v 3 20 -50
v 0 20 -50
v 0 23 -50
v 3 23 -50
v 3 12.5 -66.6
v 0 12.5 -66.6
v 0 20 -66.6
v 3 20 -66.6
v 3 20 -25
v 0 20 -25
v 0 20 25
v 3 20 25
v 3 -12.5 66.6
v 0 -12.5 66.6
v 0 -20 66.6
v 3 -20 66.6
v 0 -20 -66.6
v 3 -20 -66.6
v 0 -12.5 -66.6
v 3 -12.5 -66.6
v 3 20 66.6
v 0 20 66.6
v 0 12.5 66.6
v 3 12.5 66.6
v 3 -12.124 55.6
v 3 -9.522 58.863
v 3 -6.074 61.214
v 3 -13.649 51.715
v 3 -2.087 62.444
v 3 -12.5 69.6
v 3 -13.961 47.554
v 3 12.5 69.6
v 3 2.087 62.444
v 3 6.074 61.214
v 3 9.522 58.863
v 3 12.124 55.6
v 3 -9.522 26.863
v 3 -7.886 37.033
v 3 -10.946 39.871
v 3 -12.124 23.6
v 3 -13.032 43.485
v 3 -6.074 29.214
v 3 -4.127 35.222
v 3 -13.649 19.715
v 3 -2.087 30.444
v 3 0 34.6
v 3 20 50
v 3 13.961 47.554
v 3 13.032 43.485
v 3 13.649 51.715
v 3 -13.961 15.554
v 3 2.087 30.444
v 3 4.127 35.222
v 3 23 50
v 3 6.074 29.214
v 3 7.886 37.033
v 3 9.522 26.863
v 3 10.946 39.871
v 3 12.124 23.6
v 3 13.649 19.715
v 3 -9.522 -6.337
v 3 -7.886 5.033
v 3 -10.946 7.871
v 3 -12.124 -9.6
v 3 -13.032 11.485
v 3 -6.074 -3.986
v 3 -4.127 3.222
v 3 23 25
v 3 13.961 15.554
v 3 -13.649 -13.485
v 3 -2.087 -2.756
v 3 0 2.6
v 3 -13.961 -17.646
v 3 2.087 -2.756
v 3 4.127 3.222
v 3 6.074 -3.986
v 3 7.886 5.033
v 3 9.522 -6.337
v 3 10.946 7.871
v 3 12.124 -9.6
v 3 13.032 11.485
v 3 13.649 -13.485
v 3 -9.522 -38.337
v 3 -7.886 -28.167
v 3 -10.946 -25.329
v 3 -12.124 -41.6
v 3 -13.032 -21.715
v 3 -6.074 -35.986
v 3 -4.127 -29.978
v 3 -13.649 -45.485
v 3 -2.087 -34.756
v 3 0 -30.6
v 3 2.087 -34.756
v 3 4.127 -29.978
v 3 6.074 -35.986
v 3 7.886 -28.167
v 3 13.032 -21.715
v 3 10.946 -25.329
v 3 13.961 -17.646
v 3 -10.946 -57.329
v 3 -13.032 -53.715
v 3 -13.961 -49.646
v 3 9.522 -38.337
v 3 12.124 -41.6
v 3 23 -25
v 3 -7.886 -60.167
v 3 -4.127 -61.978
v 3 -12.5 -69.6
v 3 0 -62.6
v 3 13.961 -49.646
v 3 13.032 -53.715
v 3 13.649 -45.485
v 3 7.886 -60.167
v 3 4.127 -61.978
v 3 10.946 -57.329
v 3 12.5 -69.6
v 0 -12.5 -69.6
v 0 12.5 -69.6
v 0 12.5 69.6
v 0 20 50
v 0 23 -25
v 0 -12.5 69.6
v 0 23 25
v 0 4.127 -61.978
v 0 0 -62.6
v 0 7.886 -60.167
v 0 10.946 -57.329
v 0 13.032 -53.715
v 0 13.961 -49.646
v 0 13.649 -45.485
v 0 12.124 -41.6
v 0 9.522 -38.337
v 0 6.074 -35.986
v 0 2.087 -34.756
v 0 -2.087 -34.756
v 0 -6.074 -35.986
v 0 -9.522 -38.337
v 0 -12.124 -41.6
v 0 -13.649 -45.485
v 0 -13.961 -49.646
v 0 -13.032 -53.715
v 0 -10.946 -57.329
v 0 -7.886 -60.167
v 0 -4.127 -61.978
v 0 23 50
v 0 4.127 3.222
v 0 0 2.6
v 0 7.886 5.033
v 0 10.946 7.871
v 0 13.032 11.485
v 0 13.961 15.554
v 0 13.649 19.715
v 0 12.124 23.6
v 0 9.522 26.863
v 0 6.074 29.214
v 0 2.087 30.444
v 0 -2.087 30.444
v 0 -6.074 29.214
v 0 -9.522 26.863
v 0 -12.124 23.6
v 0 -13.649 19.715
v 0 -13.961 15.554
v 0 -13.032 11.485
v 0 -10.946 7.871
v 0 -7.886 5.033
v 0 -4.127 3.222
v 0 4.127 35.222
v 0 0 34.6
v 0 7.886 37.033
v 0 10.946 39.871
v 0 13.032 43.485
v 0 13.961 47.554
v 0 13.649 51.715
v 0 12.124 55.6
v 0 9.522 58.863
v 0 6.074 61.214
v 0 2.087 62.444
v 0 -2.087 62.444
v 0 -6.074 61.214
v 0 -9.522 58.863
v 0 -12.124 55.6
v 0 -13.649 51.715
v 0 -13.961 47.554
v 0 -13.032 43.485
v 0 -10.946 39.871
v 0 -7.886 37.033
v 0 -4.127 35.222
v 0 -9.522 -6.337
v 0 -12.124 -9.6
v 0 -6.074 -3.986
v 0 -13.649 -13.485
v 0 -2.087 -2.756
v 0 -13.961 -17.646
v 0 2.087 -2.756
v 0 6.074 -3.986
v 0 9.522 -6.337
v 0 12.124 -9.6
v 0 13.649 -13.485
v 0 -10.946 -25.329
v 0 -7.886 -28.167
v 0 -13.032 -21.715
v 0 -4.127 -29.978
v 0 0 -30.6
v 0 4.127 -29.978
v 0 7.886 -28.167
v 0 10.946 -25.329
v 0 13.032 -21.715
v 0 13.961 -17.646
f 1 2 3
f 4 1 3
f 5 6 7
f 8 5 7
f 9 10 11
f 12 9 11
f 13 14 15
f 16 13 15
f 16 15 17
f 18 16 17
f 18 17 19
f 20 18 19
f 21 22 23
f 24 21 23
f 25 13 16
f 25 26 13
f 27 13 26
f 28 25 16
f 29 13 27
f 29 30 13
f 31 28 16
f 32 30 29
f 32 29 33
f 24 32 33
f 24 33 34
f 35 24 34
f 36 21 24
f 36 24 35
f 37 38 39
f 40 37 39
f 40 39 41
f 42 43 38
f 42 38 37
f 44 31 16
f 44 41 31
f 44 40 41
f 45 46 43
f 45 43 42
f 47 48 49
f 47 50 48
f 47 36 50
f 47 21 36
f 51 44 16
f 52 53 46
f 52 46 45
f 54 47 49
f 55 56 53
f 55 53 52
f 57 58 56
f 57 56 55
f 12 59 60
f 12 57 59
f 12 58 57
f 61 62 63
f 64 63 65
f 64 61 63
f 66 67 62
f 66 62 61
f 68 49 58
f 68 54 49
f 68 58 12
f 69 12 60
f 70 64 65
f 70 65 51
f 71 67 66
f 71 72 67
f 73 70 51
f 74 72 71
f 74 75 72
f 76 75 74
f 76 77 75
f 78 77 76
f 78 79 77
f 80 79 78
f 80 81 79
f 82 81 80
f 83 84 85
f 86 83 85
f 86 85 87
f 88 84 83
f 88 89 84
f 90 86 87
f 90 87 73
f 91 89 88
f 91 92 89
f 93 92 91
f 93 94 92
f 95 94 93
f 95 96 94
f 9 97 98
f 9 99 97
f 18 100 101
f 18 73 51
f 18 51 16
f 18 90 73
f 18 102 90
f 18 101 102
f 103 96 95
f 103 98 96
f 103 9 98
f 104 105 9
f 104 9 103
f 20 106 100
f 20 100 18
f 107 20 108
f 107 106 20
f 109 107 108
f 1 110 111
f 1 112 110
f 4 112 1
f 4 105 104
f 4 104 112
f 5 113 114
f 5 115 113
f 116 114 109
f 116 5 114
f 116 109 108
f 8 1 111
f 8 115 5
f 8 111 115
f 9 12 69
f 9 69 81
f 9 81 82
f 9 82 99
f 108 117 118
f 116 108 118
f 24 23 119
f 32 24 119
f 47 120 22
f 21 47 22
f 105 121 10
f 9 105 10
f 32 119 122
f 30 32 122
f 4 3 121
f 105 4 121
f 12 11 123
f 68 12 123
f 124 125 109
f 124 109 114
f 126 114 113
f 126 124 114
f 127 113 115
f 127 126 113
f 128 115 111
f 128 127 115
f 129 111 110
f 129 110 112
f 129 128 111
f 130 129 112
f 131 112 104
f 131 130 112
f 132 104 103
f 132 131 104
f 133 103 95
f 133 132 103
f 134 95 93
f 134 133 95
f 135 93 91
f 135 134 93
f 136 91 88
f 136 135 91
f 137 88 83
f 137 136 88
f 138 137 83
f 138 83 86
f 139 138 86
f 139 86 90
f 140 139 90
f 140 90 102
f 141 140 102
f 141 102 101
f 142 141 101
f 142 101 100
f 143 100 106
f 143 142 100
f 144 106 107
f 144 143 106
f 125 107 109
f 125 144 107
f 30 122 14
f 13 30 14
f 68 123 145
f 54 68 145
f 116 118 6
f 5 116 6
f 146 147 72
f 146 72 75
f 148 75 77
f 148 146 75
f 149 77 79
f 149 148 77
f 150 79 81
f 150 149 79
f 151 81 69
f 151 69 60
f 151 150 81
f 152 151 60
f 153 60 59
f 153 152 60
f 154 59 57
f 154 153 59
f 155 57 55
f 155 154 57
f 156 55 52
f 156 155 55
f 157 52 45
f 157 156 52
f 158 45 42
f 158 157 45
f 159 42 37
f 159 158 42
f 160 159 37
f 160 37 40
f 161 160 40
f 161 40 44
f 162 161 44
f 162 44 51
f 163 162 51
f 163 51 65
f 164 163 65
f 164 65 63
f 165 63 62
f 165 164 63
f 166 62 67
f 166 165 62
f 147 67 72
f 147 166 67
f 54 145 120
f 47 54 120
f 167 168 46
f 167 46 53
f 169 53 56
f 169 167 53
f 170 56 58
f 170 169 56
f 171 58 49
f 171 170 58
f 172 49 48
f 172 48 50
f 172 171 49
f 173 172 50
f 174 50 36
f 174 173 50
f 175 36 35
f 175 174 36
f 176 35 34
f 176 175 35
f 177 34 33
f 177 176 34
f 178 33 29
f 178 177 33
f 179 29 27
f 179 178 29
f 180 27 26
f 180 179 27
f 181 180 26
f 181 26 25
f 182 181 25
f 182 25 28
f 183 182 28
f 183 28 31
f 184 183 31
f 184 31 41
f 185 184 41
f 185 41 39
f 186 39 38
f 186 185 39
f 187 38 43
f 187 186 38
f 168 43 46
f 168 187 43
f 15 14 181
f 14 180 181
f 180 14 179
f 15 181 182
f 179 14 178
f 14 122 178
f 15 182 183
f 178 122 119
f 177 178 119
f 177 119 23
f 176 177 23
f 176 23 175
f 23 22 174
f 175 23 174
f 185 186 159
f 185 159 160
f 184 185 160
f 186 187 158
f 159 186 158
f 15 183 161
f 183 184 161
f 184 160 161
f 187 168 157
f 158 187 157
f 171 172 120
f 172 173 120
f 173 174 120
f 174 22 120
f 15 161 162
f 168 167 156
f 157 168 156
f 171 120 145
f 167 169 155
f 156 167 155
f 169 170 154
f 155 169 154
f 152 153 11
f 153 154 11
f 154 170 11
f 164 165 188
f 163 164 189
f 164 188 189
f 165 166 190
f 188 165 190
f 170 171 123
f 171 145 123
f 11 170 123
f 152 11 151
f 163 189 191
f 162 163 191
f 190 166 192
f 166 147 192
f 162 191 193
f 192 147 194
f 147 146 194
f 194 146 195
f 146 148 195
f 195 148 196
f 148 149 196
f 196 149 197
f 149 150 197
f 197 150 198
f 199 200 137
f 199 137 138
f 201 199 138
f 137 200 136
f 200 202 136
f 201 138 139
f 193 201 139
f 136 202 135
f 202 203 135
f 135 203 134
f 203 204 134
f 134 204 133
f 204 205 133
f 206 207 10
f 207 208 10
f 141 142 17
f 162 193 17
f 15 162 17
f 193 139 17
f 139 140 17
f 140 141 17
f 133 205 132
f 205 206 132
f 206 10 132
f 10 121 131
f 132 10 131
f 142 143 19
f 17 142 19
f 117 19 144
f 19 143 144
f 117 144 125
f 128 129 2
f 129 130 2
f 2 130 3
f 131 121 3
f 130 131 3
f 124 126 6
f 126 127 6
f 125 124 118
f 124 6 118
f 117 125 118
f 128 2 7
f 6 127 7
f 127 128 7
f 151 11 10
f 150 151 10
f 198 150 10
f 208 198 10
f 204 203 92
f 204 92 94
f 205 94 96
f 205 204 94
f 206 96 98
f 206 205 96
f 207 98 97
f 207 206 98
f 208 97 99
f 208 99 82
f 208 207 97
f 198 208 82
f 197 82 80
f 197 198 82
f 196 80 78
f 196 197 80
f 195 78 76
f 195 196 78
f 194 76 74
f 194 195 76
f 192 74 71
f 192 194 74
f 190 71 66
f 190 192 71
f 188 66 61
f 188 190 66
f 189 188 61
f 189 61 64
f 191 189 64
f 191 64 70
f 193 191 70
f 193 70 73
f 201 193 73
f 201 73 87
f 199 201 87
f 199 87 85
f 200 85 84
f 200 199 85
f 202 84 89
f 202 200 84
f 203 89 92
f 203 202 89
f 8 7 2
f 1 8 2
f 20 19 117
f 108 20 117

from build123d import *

# Parameters (mm, degrees)
SKETCH1_R           = 14
BOSS_EXTRUDE1_DEPTH = 3


with BuildPart() as part:
    # Sketch1 → Boss-Extrude1 (new body)
    with BuildSketch(Plane(origin=(0, 0, 0), x_dir=(0, 0, -1), z_dir=(1, 0, 0))):
        Polygon((-66.6, -12.5), (-66.6, -20), (66.6, -20), (66.6, -12.5), (69.6, -12.5), (69.6, 12.5), (66.6, 12.5), (66.6, 20), (50, 20), (50, 23), (25, 23), (25, 20), (-25, 20), (-25, 23), (-50, 23), (-50, 20), (-66.6, 20), (-66.6, 12.5), (-69.6, 12.5), (-69.6, -12.5), align=None)
        with Locations((-48.6, 0)):
            Circle(SKETCH1_R, mode=Mode.SUBTRACT)
        with Locations((-16.6, 0)):
            Circle(SKETCH1_R, mode=Mode.SUBTRACT)
        with Locations((16.6, 0)):
            Circle(SKETCH1_R, mode=Mode.SUBTRACT)
        with Locations((48.6, 0)):
            Circle(SKETCH1_R, mode=Mode.SUBTRACT)
    extrude(amount=BOSS_EXTRUDE1_DEPTH)


solid = part.part
